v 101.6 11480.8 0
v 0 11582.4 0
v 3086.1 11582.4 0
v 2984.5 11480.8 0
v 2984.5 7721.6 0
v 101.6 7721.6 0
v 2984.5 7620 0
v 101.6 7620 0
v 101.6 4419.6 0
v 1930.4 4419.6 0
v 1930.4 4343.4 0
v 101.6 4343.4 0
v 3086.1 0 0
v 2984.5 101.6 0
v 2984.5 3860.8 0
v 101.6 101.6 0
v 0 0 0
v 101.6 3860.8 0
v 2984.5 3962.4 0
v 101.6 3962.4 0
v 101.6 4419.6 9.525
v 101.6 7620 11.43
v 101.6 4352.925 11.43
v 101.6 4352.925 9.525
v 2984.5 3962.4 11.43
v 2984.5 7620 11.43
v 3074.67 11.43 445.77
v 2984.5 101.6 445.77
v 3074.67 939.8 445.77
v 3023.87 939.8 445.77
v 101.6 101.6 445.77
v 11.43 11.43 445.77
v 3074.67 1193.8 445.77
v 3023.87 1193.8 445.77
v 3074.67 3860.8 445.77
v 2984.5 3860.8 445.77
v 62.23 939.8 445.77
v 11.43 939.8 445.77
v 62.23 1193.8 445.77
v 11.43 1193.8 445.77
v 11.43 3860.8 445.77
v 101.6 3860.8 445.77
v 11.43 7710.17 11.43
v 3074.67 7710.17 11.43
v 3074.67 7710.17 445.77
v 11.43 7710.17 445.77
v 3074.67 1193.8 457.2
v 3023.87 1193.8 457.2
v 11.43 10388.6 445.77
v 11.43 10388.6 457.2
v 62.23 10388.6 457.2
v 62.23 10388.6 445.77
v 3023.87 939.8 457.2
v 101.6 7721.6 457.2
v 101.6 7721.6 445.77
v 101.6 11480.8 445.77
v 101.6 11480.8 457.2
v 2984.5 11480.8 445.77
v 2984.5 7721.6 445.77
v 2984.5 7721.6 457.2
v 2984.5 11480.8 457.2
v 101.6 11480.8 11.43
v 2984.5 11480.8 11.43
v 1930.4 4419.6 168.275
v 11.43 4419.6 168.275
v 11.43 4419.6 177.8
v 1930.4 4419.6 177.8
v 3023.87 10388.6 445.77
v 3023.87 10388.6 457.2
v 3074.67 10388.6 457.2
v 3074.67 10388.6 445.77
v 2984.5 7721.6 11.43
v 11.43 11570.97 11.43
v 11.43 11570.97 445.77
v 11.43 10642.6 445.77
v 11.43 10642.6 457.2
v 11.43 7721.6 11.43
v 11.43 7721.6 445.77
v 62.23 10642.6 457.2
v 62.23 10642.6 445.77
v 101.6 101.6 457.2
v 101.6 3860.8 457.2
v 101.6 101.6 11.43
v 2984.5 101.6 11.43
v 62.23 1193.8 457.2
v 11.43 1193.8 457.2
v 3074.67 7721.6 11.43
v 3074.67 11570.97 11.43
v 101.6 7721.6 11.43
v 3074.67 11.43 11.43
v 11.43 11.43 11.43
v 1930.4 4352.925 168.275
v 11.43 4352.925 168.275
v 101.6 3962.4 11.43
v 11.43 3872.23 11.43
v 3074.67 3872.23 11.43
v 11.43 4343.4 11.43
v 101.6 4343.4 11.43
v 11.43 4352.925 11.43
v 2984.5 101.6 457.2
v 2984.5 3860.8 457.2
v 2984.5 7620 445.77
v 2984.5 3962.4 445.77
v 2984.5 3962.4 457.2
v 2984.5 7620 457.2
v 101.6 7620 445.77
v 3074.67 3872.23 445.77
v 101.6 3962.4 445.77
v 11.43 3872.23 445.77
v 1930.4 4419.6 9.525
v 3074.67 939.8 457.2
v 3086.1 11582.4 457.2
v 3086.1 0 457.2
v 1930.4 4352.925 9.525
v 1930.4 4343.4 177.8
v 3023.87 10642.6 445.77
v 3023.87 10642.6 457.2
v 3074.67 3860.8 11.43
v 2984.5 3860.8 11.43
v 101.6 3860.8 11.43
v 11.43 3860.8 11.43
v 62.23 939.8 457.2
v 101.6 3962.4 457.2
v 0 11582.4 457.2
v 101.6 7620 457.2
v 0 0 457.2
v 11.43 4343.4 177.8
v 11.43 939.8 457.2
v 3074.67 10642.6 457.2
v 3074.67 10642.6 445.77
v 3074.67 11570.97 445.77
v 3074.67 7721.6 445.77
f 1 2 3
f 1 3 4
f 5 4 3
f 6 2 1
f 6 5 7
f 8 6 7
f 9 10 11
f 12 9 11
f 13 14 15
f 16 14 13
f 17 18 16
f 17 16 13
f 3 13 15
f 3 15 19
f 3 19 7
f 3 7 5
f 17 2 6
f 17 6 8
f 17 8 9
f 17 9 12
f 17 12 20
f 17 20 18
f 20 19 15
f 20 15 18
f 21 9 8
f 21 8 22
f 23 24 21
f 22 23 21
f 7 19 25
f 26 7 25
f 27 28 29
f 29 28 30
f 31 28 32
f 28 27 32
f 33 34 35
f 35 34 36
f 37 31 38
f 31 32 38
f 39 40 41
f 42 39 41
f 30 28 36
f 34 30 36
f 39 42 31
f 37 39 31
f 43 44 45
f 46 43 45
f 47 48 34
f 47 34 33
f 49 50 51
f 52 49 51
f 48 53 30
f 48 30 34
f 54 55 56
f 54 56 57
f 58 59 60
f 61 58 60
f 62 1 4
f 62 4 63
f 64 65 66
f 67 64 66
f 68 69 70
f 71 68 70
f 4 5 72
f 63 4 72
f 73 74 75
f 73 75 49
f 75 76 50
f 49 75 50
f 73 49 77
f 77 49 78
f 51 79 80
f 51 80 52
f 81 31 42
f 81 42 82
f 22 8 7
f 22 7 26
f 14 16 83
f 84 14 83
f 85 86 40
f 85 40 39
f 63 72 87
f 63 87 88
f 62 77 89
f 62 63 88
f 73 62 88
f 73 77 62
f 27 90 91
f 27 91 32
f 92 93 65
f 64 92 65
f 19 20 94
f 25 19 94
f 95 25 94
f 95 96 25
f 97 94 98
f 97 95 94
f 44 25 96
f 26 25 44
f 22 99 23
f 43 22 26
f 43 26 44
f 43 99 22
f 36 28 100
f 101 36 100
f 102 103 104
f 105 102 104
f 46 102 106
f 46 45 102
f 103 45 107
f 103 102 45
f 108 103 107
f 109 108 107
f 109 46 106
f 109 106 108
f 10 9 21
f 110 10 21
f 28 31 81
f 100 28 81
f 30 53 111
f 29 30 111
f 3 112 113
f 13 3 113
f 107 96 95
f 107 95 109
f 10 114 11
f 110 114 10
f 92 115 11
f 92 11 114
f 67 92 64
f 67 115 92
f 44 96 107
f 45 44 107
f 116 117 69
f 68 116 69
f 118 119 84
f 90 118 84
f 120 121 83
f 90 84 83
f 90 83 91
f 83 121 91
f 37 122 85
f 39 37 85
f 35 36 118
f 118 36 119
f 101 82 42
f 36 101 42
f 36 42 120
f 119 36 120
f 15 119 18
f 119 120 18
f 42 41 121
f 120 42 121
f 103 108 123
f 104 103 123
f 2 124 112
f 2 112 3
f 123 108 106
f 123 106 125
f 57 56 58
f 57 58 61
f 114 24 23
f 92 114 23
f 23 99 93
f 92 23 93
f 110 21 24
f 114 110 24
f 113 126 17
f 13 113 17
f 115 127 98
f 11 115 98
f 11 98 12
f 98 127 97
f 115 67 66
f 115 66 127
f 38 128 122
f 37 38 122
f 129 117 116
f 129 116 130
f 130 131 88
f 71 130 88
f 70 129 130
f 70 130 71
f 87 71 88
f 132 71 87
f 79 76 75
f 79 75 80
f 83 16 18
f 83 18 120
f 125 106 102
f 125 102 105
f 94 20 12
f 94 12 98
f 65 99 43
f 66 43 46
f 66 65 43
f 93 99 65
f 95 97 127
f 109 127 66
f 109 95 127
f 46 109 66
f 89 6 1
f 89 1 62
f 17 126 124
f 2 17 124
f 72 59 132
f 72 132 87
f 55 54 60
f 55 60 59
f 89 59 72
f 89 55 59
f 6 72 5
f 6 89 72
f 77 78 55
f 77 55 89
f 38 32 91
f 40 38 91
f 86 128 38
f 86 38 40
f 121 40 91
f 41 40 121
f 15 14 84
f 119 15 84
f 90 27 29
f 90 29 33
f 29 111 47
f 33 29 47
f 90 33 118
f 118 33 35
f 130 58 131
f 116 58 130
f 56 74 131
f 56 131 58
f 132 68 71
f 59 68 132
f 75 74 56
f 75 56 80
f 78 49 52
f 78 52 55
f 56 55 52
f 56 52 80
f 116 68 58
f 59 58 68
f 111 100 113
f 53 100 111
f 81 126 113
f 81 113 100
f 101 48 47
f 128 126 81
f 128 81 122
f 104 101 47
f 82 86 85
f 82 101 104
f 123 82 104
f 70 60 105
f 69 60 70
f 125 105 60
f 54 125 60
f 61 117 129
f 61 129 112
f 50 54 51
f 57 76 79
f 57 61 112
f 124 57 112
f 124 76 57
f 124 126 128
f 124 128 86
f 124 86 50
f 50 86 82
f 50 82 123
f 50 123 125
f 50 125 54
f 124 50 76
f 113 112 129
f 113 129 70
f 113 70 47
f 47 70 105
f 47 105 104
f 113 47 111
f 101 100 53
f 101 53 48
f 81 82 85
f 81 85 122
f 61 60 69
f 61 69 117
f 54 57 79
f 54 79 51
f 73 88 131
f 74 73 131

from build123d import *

# Parameters (mm, degrees)
F2_DEPTH  = 11582.4
F6_DEPTH  = 3086.1
F10_W     = 50.8
F10_H     = 254
F11_DEPTH = 11.43
F13_DEPTH = 1930.4


# Not quite as in the source:
# - a pattern or mirror of a feature is missing from the dataset's text; its kind, count and spacing are read off the source's solid


with BuildPart() as f2:
    # F1 (on Front) → F2 (new body, through all)
    with BuildSketch(Plane.XZ):
        Polygon((0, 457.2), (0, 0), (101.6, 0), (101.6, 11.43), (11.43, 11.43), (11.43, 445.77), (101.6, 445.77), (101.6, 457.2), align=None)
    extrude(amount=-F2_DEPTH)

    # F5 (on Right) → F6 (join, through all)
    with BuildSketch(Plane.YZ):
        Polygon((0, 457.2), (0, 0), (101.6, 0), (101.6, 11.43), (11.43, 11.43), (11.43, 445.77), (101.6, 445.77), (101.6, 457.2), align=None)
        Polygon((3860.8, 457.2), (3860.8, 0), (3962.4, 0), (3962.4, 11.43), (3872.23, 11.43), (3872.23, 445.77), (3962.4, 445.77), (3962.4, 457.2), align=None)
    f6 = extrude(amount=F6_DEPTH)

    # F6_copies: F6 across plane
    add(f6.mirror(Plane.ZX.offset(5791.2)))

    # F7: F2 across plane


with BuildPart() as f2_1:
    add(f2.part)
    add(f2.part.mirror(Plane.YZ.offset(1543.05)))

    # F10 (on face) → F11 (cut, through all)
    with BuildSketch(Plane.XY.offset(457.2)):
        with Locations((36.83, 1066.8)):
            Rectangle(F10_W, F10_H)
        with Locations((3049.27, 1066.8)):
            Rectangle(F10_W, F10_H)
    f11 = extrude(amount=-F11_DEPTH, mode=Mode.SUBTRACT)

    # F11_copies: F11 across plane
    add(f11.mirror(Plane.ZX.offset(5791.2)), mode=Mode.SUBTRACT)

    # F12 (on Right) → F13 (join)
    with BuildSketch(Plane.YZ):
        Polygon((4343.4, 177.8), (4343.4, 0), (4419.6, 0), (4419.6, 9.525), (4352.925, 9.525), (4352.925, 168.275), (4419.6, 168.275), (4419.6, 177.8), align=None)
    extrude(amount=F13_DEPTH)


solid = f2_1.part
